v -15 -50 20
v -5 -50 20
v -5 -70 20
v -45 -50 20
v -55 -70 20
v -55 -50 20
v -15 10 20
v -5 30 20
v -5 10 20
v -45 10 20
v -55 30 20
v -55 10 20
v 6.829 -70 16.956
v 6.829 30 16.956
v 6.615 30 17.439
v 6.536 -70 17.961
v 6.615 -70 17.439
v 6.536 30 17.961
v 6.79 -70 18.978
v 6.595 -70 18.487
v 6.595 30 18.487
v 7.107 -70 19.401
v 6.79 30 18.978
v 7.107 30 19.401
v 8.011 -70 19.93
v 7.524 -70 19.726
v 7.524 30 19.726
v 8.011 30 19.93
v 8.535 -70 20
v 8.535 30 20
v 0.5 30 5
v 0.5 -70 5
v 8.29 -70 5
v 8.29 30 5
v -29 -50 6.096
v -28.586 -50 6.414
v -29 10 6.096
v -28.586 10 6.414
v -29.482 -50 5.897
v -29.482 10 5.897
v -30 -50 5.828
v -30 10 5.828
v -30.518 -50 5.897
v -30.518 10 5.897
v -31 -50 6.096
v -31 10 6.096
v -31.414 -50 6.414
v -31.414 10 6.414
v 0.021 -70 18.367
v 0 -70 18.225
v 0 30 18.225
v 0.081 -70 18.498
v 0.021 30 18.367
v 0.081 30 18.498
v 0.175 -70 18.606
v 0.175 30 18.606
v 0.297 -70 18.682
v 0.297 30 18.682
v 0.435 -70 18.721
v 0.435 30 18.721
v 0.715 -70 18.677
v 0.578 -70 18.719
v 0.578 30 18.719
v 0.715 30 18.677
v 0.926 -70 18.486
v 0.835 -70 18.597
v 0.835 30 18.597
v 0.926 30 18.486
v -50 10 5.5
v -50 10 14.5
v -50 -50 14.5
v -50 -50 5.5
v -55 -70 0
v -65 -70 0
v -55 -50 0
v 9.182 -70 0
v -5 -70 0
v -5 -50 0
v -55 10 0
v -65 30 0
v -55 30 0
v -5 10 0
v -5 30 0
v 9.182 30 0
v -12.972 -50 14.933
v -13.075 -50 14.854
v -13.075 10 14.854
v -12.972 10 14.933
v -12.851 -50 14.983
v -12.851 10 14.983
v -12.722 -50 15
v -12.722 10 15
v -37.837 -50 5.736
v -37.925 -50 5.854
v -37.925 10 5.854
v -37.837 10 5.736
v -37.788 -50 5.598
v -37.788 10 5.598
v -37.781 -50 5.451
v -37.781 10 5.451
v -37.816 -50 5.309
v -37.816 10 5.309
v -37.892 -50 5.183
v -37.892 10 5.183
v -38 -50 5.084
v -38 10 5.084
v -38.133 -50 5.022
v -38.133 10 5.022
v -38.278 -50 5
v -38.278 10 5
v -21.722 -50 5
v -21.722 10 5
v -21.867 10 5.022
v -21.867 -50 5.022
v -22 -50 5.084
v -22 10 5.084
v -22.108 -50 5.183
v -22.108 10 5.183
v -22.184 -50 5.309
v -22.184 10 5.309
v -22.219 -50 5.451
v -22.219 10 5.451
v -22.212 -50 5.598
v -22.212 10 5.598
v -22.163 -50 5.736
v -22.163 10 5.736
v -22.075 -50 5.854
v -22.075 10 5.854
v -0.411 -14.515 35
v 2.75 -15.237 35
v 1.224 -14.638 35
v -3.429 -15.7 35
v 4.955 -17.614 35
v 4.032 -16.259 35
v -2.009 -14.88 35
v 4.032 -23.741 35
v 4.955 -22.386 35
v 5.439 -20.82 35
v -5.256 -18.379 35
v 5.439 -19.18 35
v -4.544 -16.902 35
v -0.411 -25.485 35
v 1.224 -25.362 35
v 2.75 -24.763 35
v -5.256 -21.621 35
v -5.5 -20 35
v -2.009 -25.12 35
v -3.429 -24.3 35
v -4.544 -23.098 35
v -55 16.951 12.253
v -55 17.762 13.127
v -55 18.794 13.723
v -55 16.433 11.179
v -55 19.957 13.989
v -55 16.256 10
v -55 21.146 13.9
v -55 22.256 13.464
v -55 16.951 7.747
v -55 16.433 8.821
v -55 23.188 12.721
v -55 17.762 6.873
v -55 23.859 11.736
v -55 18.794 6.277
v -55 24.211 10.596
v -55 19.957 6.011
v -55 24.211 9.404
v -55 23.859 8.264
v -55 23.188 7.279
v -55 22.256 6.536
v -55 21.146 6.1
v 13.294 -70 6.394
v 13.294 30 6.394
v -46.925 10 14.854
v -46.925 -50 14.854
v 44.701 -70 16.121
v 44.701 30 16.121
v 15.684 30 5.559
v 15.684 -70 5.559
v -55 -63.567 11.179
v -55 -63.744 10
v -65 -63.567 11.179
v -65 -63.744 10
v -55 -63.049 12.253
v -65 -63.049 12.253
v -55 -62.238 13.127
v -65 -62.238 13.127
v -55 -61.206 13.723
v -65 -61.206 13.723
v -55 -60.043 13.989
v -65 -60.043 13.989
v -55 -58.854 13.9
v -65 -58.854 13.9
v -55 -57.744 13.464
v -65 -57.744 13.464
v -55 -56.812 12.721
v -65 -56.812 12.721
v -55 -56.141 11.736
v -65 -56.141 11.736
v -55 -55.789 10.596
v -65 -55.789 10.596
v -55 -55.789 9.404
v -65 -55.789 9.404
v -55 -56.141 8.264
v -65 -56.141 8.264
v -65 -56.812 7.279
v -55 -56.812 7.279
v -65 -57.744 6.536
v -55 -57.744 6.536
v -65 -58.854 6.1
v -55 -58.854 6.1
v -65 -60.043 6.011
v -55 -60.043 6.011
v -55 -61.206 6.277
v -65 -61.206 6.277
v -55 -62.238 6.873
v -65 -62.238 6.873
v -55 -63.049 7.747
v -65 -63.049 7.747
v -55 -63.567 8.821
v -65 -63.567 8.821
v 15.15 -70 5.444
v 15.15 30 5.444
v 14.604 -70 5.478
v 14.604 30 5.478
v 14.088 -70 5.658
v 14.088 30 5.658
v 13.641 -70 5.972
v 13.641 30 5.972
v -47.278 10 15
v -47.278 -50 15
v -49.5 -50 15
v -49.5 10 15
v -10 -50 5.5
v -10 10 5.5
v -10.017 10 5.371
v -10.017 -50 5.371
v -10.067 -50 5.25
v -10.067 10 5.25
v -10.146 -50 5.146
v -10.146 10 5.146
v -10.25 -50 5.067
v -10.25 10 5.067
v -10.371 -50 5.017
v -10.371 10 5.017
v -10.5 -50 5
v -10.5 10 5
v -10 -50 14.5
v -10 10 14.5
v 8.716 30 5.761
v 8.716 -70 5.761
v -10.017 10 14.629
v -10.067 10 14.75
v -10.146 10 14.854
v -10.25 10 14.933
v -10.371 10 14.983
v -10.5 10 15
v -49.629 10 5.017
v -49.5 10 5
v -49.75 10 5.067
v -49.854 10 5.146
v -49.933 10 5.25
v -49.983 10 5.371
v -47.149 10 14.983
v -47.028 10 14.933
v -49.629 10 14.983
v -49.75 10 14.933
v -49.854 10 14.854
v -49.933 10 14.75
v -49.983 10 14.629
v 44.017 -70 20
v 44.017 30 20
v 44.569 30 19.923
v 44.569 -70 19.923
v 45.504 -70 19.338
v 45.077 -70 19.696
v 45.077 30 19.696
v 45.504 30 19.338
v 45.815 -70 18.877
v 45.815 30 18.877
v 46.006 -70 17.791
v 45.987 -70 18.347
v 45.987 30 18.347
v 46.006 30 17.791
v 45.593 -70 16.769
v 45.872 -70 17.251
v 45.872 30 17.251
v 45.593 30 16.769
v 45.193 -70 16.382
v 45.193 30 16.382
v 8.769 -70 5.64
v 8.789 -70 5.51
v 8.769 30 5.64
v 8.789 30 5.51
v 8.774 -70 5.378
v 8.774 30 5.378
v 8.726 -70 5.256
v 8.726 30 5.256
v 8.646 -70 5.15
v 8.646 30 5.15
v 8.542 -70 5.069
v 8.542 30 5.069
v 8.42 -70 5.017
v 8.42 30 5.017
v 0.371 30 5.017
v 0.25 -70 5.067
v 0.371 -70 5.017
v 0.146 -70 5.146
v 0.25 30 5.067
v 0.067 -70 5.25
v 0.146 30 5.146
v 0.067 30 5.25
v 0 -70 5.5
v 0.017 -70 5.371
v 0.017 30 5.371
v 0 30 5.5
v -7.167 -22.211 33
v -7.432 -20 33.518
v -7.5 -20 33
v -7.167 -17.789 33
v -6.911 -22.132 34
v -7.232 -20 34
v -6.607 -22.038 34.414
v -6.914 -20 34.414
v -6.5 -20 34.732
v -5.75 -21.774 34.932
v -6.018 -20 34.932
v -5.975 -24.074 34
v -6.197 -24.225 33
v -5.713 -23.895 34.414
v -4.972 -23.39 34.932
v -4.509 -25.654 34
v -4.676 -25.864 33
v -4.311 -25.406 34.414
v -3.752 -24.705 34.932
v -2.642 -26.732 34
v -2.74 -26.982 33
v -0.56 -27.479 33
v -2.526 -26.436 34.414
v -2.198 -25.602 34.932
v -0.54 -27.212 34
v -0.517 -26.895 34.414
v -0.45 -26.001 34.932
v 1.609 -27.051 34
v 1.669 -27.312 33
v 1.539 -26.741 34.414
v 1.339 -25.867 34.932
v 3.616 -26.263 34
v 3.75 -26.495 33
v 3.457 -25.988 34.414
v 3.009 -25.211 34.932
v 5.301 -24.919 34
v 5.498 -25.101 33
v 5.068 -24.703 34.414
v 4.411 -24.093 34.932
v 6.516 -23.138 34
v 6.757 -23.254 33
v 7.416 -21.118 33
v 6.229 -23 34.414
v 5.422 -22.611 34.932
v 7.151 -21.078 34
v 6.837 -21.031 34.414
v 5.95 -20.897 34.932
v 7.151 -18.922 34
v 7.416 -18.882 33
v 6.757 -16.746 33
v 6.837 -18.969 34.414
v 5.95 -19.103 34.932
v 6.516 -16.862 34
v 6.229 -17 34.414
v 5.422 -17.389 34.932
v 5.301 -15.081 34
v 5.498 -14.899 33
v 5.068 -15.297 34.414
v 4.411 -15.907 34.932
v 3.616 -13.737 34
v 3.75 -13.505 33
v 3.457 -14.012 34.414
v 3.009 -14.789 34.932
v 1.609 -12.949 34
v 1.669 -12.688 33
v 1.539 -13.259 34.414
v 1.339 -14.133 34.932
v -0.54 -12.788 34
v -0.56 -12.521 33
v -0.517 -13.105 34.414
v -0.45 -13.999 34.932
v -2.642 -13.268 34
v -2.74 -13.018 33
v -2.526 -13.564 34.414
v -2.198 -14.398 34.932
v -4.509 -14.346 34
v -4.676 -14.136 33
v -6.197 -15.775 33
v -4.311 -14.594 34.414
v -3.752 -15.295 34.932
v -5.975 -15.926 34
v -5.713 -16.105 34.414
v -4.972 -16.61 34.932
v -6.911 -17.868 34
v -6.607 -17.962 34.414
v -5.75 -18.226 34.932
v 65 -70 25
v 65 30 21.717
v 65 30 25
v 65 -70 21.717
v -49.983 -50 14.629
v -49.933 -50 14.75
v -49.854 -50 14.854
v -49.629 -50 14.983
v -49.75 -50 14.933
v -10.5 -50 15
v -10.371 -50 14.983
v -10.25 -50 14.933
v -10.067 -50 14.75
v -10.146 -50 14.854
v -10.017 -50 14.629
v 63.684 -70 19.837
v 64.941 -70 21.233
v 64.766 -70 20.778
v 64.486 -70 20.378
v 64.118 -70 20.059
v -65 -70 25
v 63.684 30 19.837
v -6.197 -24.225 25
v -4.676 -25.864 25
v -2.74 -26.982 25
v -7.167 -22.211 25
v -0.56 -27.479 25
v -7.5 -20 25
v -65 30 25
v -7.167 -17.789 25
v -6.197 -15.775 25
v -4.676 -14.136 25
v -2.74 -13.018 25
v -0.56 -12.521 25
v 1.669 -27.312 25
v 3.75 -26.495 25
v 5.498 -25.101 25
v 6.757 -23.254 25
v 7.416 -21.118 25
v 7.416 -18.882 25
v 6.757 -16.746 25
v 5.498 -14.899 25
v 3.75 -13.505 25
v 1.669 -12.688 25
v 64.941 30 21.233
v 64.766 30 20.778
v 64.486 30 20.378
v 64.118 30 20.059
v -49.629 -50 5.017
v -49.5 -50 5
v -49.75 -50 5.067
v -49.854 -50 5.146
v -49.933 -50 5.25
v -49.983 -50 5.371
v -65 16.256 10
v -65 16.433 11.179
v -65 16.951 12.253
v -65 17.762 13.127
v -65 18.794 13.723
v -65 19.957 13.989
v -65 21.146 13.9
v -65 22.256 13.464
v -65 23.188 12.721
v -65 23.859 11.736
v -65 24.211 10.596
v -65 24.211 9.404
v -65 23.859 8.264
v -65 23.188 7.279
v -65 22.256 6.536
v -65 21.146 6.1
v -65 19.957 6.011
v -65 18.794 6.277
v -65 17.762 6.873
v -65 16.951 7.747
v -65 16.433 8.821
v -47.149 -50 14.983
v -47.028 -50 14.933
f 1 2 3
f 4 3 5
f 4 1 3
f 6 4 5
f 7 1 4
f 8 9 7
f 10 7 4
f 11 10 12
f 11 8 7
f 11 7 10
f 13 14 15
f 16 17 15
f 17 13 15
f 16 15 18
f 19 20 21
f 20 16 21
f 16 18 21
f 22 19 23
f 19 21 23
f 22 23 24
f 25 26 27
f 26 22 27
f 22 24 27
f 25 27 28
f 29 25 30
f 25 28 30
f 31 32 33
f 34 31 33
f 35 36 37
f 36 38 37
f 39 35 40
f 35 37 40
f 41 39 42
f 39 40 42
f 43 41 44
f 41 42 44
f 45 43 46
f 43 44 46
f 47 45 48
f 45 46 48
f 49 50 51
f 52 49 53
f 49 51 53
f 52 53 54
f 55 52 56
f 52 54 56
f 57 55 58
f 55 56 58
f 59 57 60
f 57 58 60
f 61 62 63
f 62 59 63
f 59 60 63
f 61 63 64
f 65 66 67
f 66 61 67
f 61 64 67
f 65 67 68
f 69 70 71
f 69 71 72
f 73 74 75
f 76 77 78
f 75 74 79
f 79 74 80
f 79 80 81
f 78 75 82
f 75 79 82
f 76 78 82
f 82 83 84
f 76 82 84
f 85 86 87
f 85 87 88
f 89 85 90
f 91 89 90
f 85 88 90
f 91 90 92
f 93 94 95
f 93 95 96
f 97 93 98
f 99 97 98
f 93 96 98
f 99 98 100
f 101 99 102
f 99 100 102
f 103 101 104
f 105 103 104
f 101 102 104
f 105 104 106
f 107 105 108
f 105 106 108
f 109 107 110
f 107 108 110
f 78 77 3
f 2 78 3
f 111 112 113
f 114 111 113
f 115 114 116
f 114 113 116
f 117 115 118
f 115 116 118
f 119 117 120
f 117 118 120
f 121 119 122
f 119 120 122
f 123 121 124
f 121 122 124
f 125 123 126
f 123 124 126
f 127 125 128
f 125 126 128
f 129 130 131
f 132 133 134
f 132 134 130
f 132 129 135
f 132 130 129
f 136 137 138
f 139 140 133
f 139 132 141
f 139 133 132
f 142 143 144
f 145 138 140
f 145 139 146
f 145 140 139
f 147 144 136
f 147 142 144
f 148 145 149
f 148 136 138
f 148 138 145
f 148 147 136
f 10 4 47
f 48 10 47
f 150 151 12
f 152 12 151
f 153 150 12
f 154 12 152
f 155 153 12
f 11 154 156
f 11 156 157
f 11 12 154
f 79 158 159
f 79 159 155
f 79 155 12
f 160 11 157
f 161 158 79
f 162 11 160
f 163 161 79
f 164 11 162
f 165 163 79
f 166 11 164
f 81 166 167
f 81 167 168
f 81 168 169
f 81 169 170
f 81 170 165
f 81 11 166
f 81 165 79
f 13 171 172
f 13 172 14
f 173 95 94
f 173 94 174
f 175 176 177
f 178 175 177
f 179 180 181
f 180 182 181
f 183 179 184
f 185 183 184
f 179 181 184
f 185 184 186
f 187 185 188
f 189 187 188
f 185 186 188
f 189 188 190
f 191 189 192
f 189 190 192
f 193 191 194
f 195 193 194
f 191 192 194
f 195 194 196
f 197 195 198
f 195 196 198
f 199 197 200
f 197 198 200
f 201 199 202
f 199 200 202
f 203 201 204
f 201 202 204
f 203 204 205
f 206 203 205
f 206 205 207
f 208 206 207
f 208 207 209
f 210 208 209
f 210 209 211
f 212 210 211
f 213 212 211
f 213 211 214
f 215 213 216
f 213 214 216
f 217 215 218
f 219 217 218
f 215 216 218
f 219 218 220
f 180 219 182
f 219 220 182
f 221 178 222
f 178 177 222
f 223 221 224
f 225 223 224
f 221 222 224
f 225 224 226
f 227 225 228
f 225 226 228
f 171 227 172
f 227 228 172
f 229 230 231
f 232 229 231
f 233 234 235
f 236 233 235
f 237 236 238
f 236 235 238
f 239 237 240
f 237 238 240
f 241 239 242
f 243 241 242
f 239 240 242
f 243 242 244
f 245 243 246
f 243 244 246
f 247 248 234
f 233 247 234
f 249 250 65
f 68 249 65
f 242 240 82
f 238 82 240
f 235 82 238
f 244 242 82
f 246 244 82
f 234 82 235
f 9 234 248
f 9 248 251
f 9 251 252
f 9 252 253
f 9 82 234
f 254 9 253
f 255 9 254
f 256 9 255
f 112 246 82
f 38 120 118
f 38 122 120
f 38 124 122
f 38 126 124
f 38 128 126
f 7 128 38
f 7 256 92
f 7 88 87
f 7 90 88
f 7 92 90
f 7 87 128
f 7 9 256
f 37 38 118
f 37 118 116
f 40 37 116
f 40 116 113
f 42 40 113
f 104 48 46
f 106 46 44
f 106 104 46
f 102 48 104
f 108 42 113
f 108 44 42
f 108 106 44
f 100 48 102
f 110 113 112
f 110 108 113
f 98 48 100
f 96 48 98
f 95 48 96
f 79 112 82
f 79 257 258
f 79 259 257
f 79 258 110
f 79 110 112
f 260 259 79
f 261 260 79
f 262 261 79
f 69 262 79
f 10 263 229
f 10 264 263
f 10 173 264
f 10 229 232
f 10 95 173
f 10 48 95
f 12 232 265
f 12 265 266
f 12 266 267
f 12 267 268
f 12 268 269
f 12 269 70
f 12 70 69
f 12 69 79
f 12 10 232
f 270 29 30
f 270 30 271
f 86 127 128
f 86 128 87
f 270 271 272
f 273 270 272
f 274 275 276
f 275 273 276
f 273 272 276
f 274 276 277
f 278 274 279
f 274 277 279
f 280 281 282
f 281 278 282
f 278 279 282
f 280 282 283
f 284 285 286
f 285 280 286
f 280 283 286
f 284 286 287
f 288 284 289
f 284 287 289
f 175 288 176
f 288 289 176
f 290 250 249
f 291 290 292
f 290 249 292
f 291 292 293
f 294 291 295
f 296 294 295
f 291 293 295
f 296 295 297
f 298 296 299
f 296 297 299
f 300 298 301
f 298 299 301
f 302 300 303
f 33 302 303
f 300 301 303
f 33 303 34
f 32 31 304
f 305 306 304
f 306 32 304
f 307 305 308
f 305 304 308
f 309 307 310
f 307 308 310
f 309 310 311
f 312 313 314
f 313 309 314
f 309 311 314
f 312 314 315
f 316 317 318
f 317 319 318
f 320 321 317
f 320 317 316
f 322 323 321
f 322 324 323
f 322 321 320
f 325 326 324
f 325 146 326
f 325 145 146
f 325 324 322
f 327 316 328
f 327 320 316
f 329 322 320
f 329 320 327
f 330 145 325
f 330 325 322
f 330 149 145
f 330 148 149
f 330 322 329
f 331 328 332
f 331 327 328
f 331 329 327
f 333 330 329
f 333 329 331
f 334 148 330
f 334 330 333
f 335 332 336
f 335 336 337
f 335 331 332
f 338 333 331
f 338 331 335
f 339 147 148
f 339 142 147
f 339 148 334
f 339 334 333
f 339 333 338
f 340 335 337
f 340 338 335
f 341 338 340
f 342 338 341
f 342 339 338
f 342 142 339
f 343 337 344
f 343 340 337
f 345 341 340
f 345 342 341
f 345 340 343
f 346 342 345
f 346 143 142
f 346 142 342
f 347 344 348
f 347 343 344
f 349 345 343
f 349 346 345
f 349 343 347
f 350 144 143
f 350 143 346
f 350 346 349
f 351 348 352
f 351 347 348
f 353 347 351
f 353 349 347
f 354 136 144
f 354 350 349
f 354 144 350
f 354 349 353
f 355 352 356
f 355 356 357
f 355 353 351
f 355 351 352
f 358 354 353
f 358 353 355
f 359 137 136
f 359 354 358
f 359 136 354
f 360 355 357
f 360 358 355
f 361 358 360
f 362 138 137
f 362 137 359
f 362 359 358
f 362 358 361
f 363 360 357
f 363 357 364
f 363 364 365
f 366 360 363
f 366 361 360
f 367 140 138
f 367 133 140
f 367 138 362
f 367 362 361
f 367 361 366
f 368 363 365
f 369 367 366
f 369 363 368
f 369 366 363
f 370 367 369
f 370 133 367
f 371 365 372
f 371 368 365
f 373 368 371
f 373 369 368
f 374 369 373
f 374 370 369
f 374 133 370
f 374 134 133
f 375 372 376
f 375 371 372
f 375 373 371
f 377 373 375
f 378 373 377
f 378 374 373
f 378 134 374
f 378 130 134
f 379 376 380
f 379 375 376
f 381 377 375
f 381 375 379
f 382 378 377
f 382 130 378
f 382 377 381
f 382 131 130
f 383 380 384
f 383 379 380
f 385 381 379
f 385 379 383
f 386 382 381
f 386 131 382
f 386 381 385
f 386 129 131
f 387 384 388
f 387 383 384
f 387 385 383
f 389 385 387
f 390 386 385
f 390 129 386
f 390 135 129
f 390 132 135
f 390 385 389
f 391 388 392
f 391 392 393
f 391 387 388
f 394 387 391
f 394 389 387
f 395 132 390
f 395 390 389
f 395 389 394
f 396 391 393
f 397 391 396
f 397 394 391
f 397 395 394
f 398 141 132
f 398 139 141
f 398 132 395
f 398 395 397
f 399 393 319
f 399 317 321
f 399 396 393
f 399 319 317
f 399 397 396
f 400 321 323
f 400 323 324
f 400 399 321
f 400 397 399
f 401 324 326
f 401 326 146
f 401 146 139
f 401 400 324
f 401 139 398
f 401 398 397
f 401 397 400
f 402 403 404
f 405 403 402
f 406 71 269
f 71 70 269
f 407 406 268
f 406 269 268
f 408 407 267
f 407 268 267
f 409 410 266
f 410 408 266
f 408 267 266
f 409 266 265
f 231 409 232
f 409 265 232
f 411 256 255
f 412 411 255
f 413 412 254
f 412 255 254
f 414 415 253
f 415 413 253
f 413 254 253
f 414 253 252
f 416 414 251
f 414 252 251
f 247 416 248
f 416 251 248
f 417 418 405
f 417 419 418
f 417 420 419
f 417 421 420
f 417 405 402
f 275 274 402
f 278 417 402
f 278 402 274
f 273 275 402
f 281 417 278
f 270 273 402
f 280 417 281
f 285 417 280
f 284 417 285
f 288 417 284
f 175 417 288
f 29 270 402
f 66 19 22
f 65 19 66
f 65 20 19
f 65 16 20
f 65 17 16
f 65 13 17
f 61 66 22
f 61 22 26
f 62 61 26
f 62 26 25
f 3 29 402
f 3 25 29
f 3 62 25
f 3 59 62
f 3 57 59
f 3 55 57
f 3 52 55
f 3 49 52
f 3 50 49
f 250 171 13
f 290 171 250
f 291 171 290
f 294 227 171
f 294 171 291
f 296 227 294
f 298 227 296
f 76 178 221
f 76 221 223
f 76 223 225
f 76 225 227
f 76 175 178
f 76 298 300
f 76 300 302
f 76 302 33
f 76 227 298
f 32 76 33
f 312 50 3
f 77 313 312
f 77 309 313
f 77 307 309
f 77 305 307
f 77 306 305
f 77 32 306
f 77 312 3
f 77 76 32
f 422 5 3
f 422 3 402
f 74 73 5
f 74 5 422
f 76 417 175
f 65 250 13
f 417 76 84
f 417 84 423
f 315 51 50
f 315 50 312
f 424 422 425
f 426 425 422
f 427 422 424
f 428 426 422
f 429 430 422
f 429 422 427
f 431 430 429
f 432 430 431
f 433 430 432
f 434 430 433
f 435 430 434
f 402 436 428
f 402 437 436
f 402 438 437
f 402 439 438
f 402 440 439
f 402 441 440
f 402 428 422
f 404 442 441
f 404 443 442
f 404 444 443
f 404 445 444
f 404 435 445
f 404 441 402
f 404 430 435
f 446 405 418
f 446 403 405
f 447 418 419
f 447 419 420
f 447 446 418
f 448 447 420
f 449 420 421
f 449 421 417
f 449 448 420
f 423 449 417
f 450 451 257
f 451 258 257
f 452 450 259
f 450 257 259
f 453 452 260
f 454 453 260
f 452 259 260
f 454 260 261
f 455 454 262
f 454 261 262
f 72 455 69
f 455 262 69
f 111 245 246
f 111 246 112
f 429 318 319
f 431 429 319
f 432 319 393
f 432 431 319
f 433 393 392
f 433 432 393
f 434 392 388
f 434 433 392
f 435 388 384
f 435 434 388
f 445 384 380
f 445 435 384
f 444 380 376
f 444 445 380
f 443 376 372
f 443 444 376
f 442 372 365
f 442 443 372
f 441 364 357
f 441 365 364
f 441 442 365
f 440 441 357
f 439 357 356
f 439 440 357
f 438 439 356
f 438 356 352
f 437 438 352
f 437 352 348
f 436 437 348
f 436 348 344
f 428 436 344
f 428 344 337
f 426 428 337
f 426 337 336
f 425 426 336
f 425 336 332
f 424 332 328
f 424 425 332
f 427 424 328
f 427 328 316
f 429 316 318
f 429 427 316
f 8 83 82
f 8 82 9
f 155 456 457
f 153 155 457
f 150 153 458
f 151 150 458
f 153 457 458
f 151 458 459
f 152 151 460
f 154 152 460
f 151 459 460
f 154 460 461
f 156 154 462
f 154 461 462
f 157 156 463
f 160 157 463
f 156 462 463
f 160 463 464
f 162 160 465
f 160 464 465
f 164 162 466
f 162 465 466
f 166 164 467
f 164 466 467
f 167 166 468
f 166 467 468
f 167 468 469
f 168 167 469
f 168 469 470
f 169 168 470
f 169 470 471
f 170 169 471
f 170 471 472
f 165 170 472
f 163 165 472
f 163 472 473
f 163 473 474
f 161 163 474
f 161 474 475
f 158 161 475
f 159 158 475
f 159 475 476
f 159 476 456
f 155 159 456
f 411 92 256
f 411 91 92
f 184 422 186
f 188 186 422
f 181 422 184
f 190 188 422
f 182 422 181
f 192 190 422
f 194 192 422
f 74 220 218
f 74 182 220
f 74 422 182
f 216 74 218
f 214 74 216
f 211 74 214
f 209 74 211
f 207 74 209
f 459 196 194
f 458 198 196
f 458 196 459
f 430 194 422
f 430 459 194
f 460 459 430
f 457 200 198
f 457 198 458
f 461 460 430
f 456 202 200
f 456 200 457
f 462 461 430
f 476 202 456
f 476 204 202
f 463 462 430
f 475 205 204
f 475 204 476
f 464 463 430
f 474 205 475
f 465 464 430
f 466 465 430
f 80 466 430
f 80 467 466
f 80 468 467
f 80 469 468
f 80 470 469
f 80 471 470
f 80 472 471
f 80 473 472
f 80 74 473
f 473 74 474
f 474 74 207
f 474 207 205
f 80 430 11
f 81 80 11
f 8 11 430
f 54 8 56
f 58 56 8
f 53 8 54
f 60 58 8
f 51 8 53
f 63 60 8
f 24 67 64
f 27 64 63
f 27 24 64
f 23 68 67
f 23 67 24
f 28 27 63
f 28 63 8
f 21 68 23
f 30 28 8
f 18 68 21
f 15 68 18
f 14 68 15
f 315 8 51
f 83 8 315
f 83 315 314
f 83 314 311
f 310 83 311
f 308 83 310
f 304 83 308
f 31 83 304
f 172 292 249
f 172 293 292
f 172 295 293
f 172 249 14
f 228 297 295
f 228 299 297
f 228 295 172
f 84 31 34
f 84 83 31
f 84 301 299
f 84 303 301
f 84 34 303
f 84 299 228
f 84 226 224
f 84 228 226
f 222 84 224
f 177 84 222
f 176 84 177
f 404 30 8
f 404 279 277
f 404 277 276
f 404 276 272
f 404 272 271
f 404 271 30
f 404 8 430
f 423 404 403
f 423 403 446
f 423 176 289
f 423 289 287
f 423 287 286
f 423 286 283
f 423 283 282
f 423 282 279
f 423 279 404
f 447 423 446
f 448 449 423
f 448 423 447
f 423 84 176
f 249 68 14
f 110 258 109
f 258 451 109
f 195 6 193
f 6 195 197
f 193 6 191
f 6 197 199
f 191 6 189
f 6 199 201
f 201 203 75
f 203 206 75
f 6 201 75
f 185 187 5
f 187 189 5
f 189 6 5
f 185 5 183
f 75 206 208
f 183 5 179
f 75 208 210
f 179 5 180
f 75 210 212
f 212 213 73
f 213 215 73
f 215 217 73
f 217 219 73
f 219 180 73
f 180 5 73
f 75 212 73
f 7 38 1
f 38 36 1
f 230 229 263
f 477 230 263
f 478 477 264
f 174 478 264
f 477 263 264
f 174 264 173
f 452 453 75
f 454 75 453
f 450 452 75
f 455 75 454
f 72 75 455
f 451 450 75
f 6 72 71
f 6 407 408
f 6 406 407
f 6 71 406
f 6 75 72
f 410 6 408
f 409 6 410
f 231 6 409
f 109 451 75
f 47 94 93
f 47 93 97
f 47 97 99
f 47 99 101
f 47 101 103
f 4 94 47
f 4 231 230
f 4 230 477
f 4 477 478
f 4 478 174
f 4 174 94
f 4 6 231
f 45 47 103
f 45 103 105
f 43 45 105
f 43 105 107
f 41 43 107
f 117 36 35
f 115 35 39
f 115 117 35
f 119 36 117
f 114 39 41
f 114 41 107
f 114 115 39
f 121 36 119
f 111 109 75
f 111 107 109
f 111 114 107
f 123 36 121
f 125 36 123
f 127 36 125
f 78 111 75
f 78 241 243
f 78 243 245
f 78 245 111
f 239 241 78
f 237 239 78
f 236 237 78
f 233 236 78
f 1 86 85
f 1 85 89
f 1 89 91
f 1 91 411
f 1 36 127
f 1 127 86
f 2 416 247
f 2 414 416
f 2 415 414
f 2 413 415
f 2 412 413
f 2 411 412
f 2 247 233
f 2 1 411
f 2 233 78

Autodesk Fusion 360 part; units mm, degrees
sketch "Sketch1" plane through (0, 0, 0) normal (0, 0, 1) x (1, 0, 0)
  line L0 (-65, 30) -> (65, 30)
  line L1 (65, 30) -> (65, -70)
  line L2 (65, -70) -> (-65, -70)
  line L3 (-65, -70) -> (-65, 30)
  dimension "d1" = 130
  dimension "d2" = 100
extrude "Extrude1" add sketch "Sketch1" along normal blind 25
sketch "Sketch3" plane through (-65, 0, 0) normal (-1, 0, 0) x (0, -1, 0)
  line L0 (-30, 0) -> (70, 0)
  line L1 (70, 0) -> (70, 25)
  line L2 (70, 25) -> (-30, 25)
  line L3 (-30, 25) -> (-30, 0)
  circle A0 centre (-20.2556, 10) radius 4
  circle A1 centre (59.7444, 10) radius 4
  dimension "d6" = 8
  dimension "d7" = 10
  dimension "d8" = 80
extrude "Extrude2" cut sketch "Sketch3" against normal blind 10 contours A0 | A1
sketch "Sketch4" plane through (0, -70, 0) normal (0, -1, 0) x (1, 0, 0)
  line L0 (-65, 0) -> (65, 0)
  line L1 (65, 0) -> (65, 25)
  line L2 (65, 25) -> (-65, 25)
  line L3 (-65, 25) -> (-65, 0)
  line L4 (-55, 0) -> (-5, 0)
  line L5 (-5, 0) -> (-5, 20)
  line L6 (-5, 20) -> (-55, 20)
  line L7 (-55, 20) -> (-55, 0)
  dimension "d11" = 10
  dimension "d12" = 20
  dimension "d15" = 50
extrude "Extrude3" cut sketch "Sketch4" against normal blind 20 contours L0 L4 L5 L6 L7
sketch "Sketch5" plane through (0, 30, 0) normal (0, 1, 0) x (-1, 0, 0)
  line L0 (-65, 0) -> (65, 0)
  line L1 (65, 0) -> (65, 25)
  line L2 (65, 25) -> (-65, 25)
  line L3 (-65, 25) -> (-65, 0)
  line L4 (5, 20) -> (55, 20)
  line L5 (55, 20) -> (55, 0)
  line L6 (55, 0) -> (5, 0)
  line L7 (5, 0) -> (5, 20)
  dimension "d16" = 50
  dimension "d17" = 20
  dimension "d19" = 10
extrude "Extrude4" cut sketch "Sketch5" against normal blind 20 contours L0 L4 L5 L6 L7
sketch "Sketch6" plane through (0, -70, 0) normal (0, -1, 0) x (1, 0, 0)
  line L0 (-55, 0) -> (-55, 20)
  line L1 (-55, 20) -> (-5, 20)
  line L2 (-5, 20) -> (-5, 0)
  line L3 (-5, 0) -> (65, 0)
  line L4 (65, 0) -> (65, 25)
  line L5 (65, 25) -> (-65, 25)
  line L6 (-65, 25) -> (-65, 0)
  line L7 (-65, 0) -> (-55, 0)
  line L8 (9.1818, 0) -> (65, 20.3162)
  dimension "d22" = 20
extrude "Extrude5" cut sketch "Sketch6" against normal through all contours L3 L4 L8
sketch "Sketch7" plane through (0, -70, 0) normal (0, -1, 0) x (1, 0, 0)
  line L0 (9.1818, 0) -> (65, 20.3162)
  line L1 (65, 20.3162) -> (65, 25)
  line L2 (65, 25) -> (-65, 25)
  line L3 (-65, 25) -> (-65, 0)
  line L4 (-65, 0) -> (-55, 0)
  line L5 (-55, 0) -> (-55, 20)
  line L6 (-55, 20) -> (-5, 20)
  line L7 (-5, 20) -> (-5, 0)
  line L8 (-5, 0) -> (9.1818, 0)
  line L9 (0, 20) -> (0, 5)
  line L10 (0, 5) -> (9.1818, 5)
  line L11 (9.1818, 5) -> (0, 20)
  line L12 (4.966, 20) -> (55.36, 20)
  line L13 (55.36, 20) -> (14.1478, 5)
  line L14 (14.1478, 5) -> (4.966, 20)
  dimension "d24" = 5
  dimension "d25" = 5
  dimension "d27" = 3
extrude "Extrude6" cut sketch "Sketch7" against normal through all contours L9 L10 L11 | L12 L13 L14
sketch "Sketch8" plane through (0, -50, 0) normal (0, -1, 0) x (1, 0, 0)
  line L0 (-55, 20) -> (-55, 0)
  line L1 (-55, 0) -> (-5, 0)
  line L2 (-5, 0) -> (-5, 20)
  line L3 (-5, 20) -> (-55, 20)
  line L4 (-45, 20) -> (-30, 5)
  line L5 (-30, 5) -> (-15, 20)
  line L6 (-45, 20) -> (-15, 20)
  dimension "d29" = 45
  dimension "d30" = 45
  dimension "d31" = 5
extrude "Extrude7" cut sketch "Sketch8" against normal through all contours L3 L4 L5 L6
sketch "Sketch9" plane through (0, -50, 0) normal (0, -1, 0) x (1, 0, 0)
  line L0 (-30, 5) -> (-45, 20)
  line L1 (-45, 20) -> (-55, 20)
  line L2 (-55, 20) -> (-55, 0)
  line L3 (-55, 0) -> (-5, 0)
  line L4 (-5, 0) -> (-5, 20)
  line L5 (-5, 20) -> (-15, 20)
  line L6 (-15, 20) -> (-30, 5)
  line L7 (-50, 15) -> (-50, 5)
  line L8 (-50, 5) -> (-37.0711, 5)
  line L9 (-37.0711, 5) -> (-47.0711, 15)
  line L10 (-47.0711, 15) -> (-50, 15)
  line L11 (-30, 13.9289) -> (-30, -2.0711)
  line L12 (-12.9289, 15) -> (-10, 15)
  line L13 (-10, 15) -> (-10, 5)
  line L14 (-10, 5) -> (-22.9289, 5)
  line L15 (-22.9289, 5) -> (-12.9289, 15)
  dimension "d33" = 5
  dimension "d34" = 5
  dimension "d35" = 5
  dimension "d36" = 5
extrude "Extrude8" cut sketch "Sketch9" against normal through all contours L7 L8 L9 L10 | L12 L13 L14 L15
sketch "Sketch10" plane through (0, 0, 25) normal (0, 0, 1) x (-1, 0, 0)
  line L0 (65, 70) -> (-65, 70)
  line L1 (-65, 70) -> (-65, -30)
  line L2 (-65, -30) -> (65, -30)
  line L3 (65, -30) -> (65, 70)
  circle A0 centre (0, 20) radius 7.5
  point P0 (0, -30)
  point P1 (65, 20)
  dimension "d38" = 15
extrude "Extrude9" add sketch "Sketch10" along normal blind 10 contours A0
fillet "Fillet1" radius 2 1 edges at (6.9925, -17.2879, 35)
fillet "Fillet1" radius 2 4 edges at (65, -20, 20.3162) (14.1478, -20, 5) (55.36, -20, 20) (4.966, -20, 20)
fillet "Fillet1" radius 0.5 3 edges at (9.1818, -20, 5) (0, -20, 5) (0, -20, 20)
fillet "Fillet1" radius 0.5 4 edges at (-10, -20, 5) (-10, -20, 15) (-12.9289, -20, 15) (-22.9289, -20, 5)
fillet "Fillet1" radius 0.5 4 edges at (-37.0711, -20, 5) (-50, -20, 5) (-50, -20, 15) (-47.0711, -20, 15)
fillet "Fillet1" radius 2 1 edges at (-30, -20, 5)
